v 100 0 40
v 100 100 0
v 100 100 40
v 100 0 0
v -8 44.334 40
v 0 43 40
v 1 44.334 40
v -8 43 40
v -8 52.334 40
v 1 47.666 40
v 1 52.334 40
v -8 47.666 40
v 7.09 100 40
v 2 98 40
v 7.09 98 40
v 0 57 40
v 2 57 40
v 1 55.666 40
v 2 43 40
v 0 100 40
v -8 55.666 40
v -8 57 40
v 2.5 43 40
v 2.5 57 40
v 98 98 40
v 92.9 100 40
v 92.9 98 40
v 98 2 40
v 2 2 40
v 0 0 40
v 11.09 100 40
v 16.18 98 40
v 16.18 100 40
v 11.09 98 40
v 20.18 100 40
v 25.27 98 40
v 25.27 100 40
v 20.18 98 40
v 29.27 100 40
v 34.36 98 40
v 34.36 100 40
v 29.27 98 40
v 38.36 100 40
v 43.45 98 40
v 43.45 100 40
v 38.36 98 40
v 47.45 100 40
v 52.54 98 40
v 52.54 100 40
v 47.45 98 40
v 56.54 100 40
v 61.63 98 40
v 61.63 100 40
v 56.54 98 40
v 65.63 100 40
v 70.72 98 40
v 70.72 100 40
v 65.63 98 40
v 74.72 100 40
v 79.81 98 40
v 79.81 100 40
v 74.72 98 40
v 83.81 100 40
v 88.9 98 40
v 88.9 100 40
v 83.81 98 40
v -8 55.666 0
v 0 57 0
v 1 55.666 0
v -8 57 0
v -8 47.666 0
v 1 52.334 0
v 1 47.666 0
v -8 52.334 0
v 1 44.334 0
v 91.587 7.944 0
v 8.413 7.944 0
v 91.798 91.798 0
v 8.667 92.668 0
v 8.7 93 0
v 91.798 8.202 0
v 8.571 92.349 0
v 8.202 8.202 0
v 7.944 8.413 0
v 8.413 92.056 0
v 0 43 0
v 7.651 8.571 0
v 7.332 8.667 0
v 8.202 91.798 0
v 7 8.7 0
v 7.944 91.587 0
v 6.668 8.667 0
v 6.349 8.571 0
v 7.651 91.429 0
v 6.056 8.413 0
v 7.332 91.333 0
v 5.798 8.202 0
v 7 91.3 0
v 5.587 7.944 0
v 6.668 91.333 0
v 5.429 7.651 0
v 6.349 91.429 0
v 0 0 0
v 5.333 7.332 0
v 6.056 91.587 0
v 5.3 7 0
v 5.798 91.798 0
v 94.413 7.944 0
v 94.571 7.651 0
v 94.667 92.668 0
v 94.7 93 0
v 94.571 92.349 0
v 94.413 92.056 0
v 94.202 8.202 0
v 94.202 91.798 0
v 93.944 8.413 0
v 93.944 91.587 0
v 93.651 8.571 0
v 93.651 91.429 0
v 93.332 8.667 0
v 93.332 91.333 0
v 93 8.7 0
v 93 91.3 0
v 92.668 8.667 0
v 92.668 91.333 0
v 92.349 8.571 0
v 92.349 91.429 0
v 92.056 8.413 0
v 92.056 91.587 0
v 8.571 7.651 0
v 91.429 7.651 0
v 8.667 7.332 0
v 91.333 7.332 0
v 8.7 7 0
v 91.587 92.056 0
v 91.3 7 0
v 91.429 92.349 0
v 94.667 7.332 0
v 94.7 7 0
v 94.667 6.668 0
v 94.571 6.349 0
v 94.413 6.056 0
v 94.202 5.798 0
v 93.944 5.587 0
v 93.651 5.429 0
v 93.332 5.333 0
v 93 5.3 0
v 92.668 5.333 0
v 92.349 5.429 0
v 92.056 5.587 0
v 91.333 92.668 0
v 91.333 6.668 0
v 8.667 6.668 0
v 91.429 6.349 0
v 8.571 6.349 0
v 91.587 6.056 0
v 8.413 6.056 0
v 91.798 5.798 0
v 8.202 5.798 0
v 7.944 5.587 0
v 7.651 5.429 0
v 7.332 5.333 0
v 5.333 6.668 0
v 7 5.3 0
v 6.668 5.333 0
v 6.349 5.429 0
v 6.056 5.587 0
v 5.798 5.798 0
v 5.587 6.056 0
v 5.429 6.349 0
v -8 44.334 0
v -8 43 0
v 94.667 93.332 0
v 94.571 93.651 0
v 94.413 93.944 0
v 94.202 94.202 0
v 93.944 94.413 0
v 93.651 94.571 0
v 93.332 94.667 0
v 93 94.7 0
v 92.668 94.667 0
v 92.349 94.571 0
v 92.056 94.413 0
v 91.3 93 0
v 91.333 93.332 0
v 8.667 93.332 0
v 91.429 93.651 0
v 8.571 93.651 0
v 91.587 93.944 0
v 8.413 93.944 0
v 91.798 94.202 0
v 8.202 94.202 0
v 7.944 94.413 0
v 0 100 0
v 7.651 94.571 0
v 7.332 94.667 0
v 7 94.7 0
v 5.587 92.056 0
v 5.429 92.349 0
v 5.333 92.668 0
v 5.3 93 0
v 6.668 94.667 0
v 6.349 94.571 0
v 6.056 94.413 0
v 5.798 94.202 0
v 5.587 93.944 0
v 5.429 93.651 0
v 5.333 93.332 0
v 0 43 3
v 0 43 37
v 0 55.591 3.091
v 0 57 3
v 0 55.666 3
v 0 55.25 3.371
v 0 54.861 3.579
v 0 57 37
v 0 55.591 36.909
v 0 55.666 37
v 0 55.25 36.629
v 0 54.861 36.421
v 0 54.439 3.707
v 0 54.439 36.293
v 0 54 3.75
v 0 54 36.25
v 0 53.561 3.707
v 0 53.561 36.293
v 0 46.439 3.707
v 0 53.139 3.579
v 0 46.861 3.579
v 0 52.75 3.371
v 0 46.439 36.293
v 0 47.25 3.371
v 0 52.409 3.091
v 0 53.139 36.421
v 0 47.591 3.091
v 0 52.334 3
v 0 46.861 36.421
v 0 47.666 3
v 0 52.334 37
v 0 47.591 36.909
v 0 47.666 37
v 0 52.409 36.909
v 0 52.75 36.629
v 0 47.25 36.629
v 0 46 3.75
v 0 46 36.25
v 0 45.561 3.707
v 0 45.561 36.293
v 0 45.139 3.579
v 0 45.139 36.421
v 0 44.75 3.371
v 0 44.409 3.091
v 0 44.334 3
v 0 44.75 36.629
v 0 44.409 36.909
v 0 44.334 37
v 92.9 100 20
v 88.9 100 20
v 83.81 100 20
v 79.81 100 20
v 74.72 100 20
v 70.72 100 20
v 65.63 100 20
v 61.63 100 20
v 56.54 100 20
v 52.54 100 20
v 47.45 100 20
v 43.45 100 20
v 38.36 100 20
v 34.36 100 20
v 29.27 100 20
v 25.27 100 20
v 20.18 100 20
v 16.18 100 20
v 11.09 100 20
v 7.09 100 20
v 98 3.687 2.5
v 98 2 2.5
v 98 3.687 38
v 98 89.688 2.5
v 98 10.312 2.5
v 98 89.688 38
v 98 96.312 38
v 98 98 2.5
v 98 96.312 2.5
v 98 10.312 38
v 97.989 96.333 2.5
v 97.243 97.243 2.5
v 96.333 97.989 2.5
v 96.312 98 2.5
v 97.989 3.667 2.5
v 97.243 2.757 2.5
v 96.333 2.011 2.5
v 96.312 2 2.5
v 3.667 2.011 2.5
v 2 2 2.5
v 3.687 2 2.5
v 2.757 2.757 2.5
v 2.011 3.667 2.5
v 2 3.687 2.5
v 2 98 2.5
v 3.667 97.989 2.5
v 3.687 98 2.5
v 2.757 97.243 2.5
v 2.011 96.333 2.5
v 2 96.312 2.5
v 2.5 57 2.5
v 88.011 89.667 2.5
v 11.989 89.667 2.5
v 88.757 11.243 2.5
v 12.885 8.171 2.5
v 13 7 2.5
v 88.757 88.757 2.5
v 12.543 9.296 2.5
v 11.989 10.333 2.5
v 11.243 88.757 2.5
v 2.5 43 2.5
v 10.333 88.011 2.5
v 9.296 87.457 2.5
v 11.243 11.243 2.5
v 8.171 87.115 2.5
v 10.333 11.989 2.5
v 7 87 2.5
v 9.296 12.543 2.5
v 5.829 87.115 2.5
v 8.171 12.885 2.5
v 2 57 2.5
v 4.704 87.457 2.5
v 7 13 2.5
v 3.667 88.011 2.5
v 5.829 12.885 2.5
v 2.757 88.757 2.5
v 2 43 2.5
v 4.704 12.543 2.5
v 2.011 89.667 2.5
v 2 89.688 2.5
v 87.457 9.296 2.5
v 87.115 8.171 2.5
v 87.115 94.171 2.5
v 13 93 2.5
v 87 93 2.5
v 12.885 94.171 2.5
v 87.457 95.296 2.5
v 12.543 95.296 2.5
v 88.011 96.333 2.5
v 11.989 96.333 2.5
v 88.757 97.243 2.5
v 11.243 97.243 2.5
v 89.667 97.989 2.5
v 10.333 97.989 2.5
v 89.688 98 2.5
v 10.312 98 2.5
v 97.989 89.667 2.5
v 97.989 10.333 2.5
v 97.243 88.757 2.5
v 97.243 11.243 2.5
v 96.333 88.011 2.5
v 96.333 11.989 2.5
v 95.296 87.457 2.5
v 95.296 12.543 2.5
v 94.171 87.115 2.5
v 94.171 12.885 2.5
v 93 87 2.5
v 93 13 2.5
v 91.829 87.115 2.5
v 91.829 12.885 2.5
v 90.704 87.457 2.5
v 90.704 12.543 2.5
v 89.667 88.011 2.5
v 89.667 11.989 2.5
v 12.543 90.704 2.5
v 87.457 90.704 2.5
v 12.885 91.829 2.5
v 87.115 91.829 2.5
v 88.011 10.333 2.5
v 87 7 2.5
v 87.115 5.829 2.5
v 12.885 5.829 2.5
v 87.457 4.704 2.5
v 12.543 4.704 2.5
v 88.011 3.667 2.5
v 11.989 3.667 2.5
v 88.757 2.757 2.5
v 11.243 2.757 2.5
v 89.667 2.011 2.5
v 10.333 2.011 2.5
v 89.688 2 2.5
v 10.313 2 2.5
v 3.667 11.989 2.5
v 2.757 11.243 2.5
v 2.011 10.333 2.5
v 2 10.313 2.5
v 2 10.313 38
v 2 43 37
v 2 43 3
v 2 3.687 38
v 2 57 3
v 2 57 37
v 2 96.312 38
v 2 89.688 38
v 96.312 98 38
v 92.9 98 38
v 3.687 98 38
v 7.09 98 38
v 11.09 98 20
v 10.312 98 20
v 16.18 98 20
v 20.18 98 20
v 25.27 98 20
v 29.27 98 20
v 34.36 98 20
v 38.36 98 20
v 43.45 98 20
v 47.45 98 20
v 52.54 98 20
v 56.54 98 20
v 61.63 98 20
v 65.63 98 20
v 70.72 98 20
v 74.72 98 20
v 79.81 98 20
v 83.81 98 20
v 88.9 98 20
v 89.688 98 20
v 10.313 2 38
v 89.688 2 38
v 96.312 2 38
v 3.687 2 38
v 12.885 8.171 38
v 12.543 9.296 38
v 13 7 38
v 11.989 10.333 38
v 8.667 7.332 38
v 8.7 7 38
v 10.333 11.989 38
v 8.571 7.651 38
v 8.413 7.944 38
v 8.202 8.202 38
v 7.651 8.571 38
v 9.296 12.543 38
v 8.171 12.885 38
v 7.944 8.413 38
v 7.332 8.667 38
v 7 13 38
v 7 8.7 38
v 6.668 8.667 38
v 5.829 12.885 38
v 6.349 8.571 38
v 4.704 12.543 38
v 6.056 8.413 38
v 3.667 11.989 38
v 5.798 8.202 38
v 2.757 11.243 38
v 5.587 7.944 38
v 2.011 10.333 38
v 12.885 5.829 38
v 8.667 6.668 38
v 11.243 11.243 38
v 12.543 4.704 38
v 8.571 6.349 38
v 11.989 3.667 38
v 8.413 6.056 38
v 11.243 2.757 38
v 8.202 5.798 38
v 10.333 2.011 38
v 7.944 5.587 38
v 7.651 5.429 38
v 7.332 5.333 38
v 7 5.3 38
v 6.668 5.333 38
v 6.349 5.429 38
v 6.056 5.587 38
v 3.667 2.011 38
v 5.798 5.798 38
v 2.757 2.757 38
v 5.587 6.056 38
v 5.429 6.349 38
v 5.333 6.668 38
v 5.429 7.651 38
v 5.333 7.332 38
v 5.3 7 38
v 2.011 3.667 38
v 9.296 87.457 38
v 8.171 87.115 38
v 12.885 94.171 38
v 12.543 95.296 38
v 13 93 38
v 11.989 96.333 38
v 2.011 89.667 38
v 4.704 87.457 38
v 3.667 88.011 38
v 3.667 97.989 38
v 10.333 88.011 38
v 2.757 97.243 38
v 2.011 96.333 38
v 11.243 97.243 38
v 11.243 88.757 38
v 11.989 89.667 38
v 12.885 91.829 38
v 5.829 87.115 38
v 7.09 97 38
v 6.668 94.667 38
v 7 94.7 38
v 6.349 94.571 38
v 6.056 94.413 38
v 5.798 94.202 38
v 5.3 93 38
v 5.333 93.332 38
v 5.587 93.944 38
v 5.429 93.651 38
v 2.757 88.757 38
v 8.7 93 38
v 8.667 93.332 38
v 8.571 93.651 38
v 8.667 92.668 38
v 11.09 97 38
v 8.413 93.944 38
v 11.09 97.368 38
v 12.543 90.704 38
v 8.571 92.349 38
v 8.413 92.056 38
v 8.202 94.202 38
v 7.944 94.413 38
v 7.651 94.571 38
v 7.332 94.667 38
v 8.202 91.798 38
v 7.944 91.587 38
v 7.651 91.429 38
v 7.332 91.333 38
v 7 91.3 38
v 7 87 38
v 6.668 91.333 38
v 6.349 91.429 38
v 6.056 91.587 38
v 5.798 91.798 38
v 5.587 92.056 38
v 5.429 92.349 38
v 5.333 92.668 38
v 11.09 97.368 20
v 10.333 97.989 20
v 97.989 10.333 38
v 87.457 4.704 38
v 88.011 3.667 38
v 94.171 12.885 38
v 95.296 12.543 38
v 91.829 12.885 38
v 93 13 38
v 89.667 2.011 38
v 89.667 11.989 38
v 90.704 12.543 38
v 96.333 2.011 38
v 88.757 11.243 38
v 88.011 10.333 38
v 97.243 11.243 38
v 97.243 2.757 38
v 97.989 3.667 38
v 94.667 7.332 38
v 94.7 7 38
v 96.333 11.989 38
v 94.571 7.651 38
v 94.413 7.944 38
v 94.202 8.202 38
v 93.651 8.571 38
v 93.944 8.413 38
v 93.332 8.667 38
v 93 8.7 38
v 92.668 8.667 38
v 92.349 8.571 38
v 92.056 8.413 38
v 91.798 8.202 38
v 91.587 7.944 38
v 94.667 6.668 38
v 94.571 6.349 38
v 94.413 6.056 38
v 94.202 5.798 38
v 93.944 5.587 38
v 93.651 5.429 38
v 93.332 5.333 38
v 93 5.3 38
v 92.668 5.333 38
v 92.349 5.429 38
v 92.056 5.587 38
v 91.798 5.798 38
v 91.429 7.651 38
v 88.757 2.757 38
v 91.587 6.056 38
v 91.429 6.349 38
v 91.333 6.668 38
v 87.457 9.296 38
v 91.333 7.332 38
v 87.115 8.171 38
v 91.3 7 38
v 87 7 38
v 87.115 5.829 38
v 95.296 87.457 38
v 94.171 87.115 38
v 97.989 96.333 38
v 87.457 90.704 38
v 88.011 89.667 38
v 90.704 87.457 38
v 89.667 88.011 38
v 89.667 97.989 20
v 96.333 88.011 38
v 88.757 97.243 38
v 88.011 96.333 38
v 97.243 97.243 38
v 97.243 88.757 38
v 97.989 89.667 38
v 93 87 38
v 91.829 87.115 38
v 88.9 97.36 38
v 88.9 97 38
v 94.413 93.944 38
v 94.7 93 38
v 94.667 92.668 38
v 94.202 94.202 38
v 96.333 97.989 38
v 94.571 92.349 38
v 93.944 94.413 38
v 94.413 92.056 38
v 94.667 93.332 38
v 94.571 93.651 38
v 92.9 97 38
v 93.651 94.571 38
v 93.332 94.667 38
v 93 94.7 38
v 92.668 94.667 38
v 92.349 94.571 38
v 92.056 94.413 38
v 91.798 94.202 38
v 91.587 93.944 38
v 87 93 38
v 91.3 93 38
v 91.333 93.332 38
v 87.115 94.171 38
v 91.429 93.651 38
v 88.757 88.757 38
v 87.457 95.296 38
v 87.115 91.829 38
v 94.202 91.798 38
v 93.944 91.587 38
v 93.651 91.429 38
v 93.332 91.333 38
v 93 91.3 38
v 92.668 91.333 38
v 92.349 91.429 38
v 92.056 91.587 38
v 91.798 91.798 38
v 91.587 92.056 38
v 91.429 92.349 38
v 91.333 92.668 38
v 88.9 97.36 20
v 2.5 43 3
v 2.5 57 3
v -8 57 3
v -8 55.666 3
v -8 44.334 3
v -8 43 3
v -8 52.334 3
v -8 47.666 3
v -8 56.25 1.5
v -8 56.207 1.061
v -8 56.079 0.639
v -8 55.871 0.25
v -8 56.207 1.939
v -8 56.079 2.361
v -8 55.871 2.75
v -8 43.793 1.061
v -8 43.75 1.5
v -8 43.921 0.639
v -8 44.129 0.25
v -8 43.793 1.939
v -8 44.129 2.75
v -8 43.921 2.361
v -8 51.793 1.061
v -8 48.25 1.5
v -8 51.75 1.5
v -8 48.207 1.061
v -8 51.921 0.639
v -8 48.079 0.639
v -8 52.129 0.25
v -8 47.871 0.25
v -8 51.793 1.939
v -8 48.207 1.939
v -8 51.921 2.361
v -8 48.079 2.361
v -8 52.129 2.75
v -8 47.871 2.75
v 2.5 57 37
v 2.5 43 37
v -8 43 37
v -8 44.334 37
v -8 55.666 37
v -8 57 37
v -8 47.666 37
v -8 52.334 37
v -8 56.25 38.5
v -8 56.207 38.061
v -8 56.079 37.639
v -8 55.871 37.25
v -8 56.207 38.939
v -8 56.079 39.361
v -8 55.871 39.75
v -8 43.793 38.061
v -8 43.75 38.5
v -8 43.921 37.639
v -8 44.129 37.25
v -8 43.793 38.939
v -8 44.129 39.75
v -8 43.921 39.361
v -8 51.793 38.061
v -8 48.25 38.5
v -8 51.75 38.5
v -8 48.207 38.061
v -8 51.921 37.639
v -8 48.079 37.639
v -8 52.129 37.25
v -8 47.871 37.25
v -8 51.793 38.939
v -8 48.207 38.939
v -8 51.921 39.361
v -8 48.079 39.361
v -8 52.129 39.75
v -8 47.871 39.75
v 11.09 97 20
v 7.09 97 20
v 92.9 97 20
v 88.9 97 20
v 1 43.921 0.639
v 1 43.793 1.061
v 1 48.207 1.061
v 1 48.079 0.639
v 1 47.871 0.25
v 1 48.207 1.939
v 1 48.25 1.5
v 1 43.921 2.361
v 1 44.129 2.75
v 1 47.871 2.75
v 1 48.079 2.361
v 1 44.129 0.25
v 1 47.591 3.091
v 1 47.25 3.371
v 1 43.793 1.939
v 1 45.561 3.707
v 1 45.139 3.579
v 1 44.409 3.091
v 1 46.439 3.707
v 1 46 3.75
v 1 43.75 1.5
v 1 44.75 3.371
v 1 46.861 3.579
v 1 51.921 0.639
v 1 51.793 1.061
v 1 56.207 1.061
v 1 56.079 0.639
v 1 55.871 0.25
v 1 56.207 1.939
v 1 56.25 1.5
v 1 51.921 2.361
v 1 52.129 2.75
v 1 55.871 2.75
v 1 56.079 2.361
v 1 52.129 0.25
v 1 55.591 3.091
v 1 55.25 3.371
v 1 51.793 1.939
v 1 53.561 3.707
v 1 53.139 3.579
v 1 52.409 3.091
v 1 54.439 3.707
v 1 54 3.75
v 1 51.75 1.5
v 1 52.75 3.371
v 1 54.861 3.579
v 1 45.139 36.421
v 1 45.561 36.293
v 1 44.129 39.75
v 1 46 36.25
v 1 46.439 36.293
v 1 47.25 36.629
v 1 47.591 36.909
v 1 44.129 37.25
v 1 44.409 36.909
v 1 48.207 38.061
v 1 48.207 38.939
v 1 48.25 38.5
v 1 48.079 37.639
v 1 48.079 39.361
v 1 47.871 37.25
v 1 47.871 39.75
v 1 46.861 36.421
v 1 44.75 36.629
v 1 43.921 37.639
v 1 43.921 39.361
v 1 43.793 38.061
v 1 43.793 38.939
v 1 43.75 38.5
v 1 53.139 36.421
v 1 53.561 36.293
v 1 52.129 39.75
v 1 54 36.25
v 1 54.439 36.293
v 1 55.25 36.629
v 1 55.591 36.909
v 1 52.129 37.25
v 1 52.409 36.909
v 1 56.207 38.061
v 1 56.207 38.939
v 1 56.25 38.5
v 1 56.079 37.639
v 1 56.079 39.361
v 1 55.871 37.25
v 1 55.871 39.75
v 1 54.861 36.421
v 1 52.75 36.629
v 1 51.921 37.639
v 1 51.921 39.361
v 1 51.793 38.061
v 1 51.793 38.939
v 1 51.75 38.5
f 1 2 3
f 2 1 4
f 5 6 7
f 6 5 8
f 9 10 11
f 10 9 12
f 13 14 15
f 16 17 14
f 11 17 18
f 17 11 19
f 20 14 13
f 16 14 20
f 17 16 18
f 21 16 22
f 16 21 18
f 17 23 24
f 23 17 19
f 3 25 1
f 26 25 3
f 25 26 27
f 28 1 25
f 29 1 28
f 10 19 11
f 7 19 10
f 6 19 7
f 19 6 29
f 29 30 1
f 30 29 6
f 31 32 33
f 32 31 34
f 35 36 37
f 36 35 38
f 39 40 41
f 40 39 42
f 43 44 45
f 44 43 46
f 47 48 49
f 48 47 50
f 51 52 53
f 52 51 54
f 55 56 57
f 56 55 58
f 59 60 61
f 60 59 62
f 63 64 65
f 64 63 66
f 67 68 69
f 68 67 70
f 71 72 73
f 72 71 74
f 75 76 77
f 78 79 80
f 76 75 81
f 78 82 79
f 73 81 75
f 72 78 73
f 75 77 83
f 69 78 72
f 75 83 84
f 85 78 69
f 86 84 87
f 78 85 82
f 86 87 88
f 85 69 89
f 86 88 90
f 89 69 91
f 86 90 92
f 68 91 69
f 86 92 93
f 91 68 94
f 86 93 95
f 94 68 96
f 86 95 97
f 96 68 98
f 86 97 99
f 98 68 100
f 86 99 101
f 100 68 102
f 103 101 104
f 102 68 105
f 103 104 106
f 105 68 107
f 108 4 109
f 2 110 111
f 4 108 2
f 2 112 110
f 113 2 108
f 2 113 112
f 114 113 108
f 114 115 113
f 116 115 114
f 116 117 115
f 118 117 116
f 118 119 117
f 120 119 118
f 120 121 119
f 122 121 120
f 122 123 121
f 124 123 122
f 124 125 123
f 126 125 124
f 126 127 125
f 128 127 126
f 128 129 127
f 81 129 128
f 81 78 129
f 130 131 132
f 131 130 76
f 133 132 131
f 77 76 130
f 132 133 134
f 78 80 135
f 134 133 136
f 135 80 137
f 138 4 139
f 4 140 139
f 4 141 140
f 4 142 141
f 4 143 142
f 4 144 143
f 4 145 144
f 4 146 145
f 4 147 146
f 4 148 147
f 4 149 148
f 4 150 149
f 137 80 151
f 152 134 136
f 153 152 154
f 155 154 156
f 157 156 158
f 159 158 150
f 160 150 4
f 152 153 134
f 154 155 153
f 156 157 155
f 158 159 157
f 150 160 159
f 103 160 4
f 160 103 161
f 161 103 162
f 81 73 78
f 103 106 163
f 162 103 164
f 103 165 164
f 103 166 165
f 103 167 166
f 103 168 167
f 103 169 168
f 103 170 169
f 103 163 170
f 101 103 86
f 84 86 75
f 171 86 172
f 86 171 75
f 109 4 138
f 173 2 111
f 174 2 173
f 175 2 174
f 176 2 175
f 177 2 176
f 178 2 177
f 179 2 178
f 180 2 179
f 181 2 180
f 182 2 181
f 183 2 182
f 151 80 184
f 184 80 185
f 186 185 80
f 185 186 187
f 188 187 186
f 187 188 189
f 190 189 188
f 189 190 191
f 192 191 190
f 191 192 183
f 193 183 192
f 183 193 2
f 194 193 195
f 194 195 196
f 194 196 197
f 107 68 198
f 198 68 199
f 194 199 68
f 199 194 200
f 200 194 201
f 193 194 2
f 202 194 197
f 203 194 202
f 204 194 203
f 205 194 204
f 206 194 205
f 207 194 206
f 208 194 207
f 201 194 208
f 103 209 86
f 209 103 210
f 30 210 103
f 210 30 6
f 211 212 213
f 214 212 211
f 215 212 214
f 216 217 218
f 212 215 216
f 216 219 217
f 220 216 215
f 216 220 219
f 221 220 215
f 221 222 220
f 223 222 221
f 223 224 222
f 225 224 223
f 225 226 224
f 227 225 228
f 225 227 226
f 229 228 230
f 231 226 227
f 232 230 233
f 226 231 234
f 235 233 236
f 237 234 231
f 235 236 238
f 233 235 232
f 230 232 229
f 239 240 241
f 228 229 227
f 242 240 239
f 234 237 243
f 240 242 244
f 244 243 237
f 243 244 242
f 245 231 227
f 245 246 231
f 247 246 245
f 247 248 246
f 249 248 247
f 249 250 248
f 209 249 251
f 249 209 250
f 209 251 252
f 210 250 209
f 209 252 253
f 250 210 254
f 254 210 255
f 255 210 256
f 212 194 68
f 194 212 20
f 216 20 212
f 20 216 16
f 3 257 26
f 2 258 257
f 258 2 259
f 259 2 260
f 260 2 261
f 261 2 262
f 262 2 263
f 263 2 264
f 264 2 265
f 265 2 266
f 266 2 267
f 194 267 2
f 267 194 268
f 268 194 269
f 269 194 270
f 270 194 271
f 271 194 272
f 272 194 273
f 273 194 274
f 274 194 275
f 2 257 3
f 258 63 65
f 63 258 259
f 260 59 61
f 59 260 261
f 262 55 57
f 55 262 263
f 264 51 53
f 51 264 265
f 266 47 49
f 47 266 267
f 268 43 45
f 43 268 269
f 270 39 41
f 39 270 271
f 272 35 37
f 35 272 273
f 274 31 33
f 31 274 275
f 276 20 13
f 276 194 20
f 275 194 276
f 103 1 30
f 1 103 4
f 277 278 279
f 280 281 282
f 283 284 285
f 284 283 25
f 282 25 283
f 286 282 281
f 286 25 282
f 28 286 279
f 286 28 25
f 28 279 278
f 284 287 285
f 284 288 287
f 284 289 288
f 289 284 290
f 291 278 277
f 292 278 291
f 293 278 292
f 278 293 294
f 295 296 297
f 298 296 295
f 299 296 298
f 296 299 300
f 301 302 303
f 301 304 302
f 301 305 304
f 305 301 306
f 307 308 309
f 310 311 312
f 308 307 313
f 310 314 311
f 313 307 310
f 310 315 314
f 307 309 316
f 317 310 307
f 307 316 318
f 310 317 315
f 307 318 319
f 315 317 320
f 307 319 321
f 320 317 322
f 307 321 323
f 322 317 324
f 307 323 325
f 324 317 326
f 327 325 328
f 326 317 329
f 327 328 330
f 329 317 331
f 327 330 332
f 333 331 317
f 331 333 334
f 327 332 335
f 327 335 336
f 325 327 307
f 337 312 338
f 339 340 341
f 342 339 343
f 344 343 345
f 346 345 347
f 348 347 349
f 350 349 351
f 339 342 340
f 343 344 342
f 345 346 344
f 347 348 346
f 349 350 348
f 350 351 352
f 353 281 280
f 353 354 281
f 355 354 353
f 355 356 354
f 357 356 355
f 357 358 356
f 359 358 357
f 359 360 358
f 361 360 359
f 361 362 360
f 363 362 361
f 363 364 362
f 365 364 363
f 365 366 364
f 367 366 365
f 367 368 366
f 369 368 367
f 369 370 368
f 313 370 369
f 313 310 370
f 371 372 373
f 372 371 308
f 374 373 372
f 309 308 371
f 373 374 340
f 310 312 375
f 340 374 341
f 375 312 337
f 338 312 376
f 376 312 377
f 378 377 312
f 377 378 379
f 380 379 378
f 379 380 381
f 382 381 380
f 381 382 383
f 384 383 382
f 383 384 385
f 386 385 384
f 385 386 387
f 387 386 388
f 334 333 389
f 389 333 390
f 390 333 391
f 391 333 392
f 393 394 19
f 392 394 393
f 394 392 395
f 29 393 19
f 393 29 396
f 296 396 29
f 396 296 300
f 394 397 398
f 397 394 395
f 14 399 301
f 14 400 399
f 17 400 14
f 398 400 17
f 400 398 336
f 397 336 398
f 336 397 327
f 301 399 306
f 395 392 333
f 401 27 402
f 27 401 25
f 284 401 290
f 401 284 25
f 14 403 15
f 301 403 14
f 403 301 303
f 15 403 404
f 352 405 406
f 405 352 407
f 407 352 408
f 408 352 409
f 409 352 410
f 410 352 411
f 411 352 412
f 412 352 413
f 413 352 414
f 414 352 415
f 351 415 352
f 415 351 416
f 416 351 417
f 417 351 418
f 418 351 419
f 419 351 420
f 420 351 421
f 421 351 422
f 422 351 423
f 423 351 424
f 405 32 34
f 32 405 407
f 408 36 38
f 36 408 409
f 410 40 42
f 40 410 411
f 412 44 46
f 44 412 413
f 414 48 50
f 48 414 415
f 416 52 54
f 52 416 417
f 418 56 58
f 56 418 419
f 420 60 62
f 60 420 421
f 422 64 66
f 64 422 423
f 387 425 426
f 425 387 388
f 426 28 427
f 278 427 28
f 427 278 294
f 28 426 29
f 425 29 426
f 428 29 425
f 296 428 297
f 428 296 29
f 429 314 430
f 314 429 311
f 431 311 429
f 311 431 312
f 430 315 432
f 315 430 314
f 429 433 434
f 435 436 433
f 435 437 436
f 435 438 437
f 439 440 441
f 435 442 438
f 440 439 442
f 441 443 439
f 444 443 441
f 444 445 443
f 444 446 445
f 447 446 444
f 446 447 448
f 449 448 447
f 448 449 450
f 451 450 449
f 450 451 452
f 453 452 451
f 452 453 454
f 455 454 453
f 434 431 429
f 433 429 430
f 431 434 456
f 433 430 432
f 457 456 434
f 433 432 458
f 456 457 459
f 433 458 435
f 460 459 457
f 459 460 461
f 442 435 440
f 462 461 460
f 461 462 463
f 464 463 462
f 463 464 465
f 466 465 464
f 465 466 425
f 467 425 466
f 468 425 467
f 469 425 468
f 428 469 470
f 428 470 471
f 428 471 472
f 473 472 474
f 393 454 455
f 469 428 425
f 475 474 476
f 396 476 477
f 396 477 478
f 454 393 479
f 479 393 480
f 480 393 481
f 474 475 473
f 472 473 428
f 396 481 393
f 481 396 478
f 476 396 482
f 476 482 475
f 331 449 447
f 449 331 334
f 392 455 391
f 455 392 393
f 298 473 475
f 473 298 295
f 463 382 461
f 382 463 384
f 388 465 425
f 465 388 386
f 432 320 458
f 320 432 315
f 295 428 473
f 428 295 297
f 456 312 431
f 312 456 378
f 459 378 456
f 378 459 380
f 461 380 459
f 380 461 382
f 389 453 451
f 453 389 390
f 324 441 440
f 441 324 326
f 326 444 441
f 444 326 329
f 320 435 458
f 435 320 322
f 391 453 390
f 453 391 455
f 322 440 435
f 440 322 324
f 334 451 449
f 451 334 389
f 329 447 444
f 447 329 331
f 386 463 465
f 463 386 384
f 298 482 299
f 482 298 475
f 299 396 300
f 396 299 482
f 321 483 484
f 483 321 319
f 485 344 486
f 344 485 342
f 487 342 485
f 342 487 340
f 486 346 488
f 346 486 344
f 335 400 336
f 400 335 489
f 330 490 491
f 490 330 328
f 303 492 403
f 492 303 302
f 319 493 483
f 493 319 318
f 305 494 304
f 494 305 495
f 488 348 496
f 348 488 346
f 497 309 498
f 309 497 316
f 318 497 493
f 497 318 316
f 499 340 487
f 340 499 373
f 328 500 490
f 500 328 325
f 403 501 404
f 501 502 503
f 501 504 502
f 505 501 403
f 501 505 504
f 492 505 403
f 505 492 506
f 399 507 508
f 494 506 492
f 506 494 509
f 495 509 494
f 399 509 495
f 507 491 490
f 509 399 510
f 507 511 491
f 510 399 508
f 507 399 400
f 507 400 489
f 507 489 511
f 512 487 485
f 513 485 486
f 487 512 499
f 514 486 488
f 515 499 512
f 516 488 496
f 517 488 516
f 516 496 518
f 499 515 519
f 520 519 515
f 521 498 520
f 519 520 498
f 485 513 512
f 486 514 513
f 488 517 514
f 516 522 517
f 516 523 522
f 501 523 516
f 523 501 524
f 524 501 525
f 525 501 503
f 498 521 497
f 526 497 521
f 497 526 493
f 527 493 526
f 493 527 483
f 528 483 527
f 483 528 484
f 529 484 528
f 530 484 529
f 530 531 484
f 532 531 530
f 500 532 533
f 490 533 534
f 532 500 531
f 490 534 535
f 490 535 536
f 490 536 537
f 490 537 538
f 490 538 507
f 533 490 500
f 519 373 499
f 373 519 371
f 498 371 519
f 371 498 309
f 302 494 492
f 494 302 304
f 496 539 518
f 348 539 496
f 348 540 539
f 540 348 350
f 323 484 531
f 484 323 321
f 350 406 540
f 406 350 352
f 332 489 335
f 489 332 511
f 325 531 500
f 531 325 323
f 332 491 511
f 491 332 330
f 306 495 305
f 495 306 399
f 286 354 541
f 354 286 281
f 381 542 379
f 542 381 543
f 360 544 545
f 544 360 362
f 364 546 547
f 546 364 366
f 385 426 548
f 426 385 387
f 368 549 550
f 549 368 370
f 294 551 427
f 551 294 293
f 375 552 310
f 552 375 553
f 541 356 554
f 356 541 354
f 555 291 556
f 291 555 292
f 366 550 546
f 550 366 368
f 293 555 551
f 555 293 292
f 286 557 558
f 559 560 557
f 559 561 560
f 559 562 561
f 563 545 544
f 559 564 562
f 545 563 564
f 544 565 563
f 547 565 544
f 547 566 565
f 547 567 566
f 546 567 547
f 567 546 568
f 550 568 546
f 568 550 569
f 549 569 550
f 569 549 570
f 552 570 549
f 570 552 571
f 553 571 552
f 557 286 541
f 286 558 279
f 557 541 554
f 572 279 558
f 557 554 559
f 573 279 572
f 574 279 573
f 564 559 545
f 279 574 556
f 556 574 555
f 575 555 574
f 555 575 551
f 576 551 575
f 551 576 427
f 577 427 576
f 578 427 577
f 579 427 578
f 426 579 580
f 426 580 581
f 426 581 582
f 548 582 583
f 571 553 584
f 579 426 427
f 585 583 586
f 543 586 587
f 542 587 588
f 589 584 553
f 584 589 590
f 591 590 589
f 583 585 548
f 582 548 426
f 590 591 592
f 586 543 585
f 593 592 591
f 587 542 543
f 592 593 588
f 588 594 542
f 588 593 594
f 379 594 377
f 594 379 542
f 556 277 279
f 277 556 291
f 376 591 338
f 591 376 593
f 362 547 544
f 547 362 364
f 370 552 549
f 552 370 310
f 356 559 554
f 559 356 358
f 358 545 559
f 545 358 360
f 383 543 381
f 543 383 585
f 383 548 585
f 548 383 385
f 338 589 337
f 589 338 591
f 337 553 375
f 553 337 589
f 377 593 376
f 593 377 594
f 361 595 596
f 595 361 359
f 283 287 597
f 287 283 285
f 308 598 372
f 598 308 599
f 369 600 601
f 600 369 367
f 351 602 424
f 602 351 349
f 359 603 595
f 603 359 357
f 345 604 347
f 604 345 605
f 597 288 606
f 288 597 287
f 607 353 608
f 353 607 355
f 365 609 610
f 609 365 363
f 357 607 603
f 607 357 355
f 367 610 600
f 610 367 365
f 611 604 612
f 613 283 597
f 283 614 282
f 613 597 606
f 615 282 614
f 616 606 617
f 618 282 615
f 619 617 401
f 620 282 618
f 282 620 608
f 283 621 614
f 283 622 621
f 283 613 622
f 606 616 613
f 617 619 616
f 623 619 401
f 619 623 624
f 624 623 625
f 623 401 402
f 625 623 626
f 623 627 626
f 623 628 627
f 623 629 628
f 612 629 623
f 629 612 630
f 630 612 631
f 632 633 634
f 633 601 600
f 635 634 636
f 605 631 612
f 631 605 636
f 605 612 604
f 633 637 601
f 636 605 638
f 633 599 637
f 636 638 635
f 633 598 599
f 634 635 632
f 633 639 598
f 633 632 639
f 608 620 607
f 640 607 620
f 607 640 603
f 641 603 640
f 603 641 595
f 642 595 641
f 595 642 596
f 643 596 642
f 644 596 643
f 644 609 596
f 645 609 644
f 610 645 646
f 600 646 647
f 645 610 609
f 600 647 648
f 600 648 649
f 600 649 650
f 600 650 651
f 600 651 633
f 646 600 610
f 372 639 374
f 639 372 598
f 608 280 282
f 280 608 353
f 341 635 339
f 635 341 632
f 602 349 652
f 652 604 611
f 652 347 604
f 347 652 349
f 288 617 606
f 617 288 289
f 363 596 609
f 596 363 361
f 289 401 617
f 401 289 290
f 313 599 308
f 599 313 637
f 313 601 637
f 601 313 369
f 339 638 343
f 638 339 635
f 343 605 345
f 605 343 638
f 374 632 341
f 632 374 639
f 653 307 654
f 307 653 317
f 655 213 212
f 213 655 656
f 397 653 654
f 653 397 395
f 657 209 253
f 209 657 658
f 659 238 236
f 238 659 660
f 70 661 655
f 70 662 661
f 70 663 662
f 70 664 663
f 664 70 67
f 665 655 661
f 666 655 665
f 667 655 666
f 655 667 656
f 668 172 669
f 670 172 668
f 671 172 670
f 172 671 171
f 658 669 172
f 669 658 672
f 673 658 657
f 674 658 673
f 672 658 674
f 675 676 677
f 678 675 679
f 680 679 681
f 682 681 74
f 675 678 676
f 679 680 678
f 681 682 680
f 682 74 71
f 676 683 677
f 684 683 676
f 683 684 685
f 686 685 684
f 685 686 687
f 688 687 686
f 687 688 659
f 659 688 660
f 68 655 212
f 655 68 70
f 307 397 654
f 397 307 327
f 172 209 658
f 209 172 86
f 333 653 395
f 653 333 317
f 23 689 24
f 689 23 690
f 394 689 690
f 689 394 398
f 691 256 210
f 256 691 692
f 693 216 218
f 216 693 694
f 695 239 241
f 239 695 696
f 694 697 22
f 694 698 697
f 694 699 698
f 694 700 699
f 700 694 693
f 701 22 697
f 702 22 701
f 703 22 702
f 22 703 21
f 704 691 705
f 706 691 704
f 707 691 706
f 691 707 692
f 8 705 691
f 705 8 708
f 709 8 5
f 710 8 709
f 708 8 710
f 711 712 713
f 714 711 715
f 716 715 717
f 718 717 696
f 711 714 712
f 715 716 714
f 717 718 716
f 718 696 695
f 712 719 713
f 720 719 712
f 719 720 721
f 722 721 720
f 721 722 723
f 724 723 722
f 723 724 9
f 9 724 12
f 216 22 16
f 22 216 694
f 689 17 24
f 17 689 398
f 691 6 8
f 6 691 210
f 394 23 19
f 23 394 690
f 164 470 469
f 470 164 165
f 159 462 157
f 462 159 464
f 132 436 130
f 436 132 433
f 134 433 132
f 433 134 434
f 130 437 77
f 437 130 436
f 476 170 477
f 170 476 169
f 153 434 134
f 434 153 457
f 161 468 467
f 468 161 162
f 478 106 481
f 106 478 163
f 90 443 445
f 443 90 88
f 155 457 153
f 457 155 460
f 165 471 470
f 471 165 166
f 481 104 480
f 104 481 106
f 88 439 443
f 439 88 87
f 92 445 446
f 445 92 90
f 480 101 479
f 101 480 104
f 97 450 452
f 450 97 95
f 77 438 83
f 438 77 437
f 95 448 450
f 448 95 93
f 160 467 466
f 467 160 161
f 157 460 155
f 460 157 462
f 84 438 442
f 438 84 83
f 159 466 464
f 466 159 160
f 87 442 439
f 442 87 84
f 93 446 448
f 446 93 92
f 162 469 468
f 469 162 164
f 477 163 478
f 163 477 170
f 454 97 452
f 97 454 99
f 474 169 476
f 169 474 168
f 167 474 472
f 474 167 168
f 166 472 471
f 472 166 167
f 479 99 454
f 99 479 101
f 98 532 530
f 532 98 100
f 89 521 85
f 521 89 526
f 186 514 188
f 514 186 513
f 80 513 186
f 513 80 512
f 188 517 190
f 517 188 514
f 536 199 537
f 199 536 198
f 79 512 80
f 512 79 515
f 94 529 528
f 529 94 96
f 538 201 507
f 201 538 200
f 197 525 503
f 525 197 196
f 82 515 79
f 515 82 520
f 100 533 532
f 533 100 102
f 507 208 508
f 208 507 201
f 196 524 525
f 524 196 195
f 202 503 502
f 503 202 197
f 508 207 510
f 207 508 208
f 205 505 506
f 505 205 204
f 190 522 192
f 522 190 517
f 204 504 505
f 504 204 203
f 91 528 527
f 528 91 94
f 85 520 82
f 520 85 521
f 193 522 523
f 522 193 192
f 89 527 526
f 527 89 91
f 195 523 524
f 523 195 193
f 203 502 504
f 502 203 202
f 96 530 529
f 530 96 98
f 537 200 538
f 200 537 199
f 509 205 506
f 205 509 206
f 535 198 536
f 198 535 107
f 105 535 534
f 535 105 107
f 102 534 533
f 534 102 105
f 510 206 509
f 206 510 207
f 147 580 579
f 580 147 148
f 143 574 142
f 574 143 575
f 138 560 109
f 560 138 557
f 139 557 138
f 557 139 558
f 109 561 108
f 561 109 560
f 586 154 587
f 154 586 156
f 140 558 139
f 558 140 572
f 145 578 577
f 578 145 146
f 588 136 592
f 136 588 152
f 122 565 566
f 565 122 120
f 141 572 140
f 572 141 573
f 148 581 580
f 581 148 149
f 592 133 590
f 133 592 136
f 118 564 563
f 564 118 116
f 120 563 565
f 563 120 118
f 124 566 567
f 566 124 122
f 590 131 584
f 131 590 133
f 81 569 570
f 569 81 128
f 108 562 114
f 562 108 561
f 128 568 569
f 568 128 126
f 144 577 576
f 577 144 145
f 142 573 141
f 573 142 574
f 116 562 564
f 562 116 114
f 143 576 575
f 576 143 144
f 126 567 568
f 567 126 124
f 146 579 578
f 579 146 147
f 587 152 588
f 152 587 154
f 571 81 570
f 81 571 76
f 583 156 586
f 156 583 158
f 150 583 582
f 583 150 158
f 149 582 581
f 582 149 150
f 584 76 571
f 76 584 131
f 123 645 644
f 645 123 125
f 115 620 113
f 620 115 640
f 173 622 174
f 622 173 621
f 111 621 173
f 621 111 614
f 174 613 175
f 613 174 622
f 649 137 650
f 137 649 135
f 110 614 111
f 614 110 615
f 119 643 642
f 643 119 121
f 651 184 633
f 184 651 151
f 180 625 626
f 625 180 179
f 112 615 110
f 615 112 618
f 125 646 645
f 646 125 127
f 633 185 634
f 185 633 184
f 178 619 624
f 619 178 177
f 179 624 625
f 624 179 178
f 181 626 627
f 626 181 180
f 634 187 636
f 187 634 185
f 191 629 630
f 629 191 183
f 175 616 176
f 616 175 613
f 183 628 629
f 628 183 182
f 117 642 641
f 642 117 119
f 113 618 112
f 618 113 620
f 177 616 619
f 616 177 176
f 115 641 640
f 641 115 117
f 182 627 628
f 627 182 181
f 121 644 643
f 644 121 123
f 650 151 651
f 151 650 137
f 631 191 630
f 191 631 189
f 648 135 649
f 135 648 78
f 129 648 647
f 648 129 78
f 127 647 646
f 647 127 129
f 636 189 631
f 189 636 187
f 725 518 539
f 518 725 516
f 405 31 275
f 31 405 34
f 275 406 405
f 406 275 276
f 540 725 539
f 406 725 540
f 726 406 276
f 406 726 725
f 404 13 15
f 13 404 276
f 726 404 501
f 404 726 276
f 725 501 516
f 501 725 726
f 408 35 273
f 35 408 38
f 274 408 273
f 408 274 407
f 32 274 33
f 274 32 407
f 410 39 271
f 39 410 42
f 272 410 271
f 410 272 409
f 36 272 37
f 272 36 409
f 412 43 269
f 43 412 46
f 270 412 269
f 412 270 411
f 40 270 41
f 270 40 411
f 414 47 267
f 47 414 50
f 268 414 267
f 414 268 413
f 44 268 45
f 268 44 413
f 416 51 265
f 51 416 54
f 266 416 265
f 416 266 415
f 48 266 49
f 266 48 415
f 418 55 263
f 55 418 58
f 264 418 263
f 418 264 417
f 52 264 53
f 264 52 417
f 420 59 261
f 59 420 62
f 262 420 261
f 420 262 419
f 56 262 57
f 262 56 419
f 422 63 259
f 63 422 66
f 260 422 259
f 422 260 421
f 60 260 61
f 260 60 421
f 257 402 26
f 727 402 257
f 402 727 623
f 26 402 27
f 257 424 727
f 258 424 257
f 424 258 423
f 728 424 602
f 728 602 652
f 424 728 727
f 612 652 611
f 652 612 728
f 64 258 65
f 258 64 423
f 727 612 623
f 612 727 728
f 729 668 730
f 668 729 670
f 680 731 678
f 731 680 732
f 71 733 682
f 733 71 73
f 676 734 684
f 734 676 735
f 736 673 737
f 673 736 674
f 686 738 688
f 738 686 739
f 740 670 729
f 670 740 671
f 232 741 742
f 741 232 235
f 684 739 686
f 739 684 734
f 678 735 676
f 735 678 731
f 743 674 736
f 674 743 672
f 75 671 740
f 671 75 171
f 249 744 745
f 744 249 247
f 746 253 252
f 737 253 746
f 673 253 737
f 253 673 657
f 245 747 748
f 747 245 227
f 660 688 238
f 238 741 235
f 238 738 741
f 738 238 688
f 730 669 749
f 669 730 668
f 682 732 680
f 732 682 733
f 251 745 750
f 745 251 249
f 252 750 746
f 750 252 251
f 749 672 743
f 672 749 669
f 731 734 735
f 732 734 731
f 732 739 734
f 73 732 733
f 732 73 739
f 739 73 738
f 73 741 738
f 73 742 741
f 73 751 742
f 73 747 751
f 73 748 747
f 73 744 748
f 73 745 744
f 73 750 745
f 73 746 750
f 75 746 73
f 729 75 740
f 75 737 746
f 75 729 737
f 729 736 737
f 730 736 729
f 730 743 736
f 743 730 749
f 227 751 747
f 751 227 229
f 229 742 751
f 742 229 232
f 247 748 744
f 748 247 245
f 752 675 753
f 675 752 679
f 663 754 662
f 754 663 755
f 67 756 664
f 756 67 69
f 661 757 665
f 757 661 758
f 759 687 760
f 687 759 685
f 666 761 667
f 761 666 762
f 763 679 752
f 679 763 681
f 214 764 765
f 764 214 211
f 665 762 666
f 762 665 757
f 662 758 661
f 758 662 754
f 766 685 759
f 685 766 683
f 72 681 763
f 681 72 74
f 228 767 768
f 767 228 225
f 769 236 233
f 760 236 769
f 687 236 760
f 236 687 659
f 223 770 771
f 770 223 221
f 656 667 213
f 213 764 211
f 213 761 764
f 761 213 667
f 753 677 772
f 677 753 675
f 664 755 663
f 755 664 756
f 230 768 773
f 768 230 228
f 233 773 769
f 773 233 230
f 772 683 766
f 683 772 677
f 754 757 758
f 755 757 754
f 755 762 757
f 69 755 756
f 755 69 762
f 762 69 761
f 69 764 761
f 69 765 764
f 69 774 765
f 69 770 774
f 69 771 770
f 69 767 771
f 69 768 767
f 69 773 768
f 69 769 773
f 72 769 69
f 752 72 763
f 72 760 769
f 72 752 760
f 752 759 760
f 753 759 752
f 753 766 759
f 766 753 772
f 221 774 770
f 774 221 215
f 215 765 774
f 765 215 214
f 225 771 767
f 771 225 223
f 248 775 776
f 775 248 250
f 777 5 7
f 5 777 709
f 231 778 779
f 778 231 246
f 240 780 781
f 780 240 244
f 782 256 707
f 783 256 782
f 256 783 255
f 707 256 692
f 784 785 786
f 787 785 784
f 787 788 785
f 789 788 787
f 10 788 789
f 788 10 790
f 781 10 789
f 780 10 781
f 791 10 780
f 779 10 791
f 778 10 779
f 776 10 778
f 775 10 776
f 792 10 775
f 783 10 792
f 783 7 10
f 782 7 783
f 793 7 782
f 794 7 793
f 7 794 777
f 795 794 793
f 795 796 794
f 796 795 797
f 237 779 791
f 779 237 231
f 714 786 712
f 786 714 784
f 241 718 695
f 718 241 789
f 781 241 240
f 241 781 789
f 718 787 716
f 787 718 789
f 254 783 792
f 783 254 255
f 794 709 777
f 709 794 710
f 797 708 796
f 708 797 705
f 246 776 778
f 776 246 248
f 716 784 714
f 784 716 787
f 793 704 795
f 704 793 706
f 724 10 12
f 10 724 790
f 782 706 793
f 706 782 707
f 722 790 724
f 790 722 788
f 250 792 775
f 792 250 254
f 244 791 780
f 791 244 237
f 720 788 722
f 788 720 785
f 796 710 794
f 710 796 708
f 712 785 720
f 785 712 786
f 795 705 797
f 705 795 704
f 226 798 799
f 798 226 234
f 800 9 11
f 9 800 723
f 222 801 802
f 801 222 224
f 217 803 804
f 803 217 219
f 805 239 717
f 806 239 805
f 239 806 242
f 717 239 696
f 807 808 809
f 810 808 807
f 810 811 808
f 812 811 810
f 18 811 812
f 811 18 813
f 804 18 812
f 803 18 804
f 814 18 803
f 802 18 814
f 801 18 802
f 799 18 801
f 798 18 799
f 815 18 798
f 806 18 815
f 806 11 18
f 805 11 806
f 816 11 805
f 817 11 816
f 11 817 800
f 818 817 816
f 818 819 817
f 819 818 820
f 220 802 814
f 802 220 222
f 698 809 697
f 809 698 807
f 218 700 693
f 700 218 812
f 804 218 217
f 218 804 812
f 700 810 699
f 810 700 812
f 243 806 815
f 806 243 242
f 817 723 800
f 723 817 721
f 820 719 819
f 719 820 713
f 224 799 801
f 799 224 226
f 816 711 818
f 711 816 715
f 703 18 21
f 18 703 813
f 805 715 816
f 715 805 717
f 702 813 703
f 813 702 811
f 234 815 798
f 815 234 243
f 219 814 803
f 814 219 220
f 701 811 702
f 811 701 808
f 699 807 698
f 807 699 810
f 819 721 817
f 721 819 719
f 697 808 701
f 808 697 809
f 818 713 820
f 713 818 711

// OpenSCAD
$fn = 32;

// ----------------------------------------------------------------------
// Enclosure body: 100 x 100 x 40 mm, wall 2 mm
// ----------------------------------------------------------------------

// --- parameters (mm) ---
length = 100;             // outside length, X
width = 100;              // outside width, Y
height = 40;              // outside height, Z
wall = 2;                 // side wall thickness
floor_t = 2.5;            // floor thickness
boss_d = 12;              // corner boss diameter
boss_h = 35.5;            // corner boss height above the floor
boss_hole_d = 3.4;        // lid screw clearance in the boss
boss_lip = 7;             // boss centre inset from the corner
ear_w = 14;               // mounting ear width
ear_t = 3;                // mounting ear thickness
ear_ext = 8;              // mounting ear reach
ear_hole_d = 4.5;         // mounting ear drills
vent_slots = 10;          // vent slots in the long wall
vent_w = 4;               // vent slot width
vent_h = 25;              // vent slot height
vent_pitch = 9.09;        // vent slot pitch
vent_z = 20;              // vent slot sill height

module shell() {
  difference() {
    cube([length, width, height]);
    /* hollow, open at the top */
    translate([wall, wall, floor_t])
      cube([length - 2 * wall, width - 2 * wall, height]);
  }
}

module bosses() {
  /* corner bosses, sunk 1 mm into the floor */
  for (sx = [0, 1]) for (sy = [0, 1])
    translate([sx * (length - 2 * boss_lip) + boss_lip, sy * (width - 2 * boss_lip) + boss_lip, floor_t - 1])
      cylinder(h = boss_h + 1, d = boss_d);
}

module ears() {
  /* mounting ears on the short walls, sunk into the wall */
  for (sz = [0, 1])
    translate([-ear_ext, width / 2 - ear_w / 2, sz * (height - ear_t)])
      cube([ear_ext + 2.5, ear_w, ear_t]);
}

difference() {
  union() {
    shell();
    bosses();
    ears();
  }
  /* boss screw holes */
  for (sx = [0, 1]) for (sy = [0, 1])
    translate([sx * (length - 2 * boss_lip) + boss_lip, sy * (width - 2 * boss_lip) + boss_lip, -1]) cylinder(h = floor_t + boss_h + 2, d = boss_hole_d);
  /* vent grille in the +Y wall */
  for (i = [0 : vent_slots - 1]) translate([vent_pitch * (i + 1) - vent_w / 2, width - wall - 1, vent_z]) cube([vent_w, wall + 2, vent_h]);
  for (sz = [0, 1]) for (sx = [0, 1]) translate([-ear_ext - 1, width / 2 + (2 * sx - 1) * (ear_w / 2 - 3), sz * (height - ear_t) + ear_t / 2]) rotate([0, 90, 0]) cylinder(h = ear_ext + 2, d = ear_hole_d);
}
